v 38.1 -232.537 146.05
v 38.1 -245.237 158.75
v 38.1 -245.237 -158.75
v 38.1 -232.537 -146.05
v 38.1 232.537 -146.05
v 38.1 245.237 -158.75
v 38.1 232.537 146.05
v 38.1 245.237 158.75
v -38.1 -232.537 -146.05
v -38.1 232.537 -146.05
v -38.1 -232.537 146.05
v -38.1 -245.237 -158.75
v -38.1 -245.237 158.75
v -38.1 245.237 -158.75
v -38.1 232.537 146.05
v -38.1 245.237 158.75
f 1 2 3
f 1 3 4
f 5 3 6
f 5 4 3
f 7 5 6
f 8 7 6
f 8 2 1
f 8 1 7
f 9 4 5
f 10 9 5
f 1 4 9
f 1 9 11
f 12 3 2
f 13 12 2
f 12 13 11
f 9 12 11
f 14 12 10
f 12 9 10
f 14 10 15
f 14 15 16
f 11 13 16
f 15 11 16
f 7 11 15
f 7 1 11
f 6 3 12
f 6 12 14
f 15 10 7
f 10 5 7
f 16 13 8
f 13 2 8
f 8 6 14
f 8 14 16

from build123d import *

# Parameters (mm, degrees)
F0_W     = 490.474
F0_H     = 317.5
F0_W_2   = 465.074
F0_H_2   = 292.1
F1_DEPTH = 38.1


# Not quite as in the source:
# - the program builds the solid bodies; features that only make, move or delete a surface that nothing else refers to are left out


with BuildPart() as f1:
    # F0 (on Right) → F1 (new body, symmetric)
    with BuildSketch(Plane.YZ):
        Rectangle(F0_W, F0_H)
        Rectangle(F0_W_2, F0_H_2, mode=Mode.SUBTRACT)
    extrude(amount=F1_DEPTH, both=True)


solid = f1.part
